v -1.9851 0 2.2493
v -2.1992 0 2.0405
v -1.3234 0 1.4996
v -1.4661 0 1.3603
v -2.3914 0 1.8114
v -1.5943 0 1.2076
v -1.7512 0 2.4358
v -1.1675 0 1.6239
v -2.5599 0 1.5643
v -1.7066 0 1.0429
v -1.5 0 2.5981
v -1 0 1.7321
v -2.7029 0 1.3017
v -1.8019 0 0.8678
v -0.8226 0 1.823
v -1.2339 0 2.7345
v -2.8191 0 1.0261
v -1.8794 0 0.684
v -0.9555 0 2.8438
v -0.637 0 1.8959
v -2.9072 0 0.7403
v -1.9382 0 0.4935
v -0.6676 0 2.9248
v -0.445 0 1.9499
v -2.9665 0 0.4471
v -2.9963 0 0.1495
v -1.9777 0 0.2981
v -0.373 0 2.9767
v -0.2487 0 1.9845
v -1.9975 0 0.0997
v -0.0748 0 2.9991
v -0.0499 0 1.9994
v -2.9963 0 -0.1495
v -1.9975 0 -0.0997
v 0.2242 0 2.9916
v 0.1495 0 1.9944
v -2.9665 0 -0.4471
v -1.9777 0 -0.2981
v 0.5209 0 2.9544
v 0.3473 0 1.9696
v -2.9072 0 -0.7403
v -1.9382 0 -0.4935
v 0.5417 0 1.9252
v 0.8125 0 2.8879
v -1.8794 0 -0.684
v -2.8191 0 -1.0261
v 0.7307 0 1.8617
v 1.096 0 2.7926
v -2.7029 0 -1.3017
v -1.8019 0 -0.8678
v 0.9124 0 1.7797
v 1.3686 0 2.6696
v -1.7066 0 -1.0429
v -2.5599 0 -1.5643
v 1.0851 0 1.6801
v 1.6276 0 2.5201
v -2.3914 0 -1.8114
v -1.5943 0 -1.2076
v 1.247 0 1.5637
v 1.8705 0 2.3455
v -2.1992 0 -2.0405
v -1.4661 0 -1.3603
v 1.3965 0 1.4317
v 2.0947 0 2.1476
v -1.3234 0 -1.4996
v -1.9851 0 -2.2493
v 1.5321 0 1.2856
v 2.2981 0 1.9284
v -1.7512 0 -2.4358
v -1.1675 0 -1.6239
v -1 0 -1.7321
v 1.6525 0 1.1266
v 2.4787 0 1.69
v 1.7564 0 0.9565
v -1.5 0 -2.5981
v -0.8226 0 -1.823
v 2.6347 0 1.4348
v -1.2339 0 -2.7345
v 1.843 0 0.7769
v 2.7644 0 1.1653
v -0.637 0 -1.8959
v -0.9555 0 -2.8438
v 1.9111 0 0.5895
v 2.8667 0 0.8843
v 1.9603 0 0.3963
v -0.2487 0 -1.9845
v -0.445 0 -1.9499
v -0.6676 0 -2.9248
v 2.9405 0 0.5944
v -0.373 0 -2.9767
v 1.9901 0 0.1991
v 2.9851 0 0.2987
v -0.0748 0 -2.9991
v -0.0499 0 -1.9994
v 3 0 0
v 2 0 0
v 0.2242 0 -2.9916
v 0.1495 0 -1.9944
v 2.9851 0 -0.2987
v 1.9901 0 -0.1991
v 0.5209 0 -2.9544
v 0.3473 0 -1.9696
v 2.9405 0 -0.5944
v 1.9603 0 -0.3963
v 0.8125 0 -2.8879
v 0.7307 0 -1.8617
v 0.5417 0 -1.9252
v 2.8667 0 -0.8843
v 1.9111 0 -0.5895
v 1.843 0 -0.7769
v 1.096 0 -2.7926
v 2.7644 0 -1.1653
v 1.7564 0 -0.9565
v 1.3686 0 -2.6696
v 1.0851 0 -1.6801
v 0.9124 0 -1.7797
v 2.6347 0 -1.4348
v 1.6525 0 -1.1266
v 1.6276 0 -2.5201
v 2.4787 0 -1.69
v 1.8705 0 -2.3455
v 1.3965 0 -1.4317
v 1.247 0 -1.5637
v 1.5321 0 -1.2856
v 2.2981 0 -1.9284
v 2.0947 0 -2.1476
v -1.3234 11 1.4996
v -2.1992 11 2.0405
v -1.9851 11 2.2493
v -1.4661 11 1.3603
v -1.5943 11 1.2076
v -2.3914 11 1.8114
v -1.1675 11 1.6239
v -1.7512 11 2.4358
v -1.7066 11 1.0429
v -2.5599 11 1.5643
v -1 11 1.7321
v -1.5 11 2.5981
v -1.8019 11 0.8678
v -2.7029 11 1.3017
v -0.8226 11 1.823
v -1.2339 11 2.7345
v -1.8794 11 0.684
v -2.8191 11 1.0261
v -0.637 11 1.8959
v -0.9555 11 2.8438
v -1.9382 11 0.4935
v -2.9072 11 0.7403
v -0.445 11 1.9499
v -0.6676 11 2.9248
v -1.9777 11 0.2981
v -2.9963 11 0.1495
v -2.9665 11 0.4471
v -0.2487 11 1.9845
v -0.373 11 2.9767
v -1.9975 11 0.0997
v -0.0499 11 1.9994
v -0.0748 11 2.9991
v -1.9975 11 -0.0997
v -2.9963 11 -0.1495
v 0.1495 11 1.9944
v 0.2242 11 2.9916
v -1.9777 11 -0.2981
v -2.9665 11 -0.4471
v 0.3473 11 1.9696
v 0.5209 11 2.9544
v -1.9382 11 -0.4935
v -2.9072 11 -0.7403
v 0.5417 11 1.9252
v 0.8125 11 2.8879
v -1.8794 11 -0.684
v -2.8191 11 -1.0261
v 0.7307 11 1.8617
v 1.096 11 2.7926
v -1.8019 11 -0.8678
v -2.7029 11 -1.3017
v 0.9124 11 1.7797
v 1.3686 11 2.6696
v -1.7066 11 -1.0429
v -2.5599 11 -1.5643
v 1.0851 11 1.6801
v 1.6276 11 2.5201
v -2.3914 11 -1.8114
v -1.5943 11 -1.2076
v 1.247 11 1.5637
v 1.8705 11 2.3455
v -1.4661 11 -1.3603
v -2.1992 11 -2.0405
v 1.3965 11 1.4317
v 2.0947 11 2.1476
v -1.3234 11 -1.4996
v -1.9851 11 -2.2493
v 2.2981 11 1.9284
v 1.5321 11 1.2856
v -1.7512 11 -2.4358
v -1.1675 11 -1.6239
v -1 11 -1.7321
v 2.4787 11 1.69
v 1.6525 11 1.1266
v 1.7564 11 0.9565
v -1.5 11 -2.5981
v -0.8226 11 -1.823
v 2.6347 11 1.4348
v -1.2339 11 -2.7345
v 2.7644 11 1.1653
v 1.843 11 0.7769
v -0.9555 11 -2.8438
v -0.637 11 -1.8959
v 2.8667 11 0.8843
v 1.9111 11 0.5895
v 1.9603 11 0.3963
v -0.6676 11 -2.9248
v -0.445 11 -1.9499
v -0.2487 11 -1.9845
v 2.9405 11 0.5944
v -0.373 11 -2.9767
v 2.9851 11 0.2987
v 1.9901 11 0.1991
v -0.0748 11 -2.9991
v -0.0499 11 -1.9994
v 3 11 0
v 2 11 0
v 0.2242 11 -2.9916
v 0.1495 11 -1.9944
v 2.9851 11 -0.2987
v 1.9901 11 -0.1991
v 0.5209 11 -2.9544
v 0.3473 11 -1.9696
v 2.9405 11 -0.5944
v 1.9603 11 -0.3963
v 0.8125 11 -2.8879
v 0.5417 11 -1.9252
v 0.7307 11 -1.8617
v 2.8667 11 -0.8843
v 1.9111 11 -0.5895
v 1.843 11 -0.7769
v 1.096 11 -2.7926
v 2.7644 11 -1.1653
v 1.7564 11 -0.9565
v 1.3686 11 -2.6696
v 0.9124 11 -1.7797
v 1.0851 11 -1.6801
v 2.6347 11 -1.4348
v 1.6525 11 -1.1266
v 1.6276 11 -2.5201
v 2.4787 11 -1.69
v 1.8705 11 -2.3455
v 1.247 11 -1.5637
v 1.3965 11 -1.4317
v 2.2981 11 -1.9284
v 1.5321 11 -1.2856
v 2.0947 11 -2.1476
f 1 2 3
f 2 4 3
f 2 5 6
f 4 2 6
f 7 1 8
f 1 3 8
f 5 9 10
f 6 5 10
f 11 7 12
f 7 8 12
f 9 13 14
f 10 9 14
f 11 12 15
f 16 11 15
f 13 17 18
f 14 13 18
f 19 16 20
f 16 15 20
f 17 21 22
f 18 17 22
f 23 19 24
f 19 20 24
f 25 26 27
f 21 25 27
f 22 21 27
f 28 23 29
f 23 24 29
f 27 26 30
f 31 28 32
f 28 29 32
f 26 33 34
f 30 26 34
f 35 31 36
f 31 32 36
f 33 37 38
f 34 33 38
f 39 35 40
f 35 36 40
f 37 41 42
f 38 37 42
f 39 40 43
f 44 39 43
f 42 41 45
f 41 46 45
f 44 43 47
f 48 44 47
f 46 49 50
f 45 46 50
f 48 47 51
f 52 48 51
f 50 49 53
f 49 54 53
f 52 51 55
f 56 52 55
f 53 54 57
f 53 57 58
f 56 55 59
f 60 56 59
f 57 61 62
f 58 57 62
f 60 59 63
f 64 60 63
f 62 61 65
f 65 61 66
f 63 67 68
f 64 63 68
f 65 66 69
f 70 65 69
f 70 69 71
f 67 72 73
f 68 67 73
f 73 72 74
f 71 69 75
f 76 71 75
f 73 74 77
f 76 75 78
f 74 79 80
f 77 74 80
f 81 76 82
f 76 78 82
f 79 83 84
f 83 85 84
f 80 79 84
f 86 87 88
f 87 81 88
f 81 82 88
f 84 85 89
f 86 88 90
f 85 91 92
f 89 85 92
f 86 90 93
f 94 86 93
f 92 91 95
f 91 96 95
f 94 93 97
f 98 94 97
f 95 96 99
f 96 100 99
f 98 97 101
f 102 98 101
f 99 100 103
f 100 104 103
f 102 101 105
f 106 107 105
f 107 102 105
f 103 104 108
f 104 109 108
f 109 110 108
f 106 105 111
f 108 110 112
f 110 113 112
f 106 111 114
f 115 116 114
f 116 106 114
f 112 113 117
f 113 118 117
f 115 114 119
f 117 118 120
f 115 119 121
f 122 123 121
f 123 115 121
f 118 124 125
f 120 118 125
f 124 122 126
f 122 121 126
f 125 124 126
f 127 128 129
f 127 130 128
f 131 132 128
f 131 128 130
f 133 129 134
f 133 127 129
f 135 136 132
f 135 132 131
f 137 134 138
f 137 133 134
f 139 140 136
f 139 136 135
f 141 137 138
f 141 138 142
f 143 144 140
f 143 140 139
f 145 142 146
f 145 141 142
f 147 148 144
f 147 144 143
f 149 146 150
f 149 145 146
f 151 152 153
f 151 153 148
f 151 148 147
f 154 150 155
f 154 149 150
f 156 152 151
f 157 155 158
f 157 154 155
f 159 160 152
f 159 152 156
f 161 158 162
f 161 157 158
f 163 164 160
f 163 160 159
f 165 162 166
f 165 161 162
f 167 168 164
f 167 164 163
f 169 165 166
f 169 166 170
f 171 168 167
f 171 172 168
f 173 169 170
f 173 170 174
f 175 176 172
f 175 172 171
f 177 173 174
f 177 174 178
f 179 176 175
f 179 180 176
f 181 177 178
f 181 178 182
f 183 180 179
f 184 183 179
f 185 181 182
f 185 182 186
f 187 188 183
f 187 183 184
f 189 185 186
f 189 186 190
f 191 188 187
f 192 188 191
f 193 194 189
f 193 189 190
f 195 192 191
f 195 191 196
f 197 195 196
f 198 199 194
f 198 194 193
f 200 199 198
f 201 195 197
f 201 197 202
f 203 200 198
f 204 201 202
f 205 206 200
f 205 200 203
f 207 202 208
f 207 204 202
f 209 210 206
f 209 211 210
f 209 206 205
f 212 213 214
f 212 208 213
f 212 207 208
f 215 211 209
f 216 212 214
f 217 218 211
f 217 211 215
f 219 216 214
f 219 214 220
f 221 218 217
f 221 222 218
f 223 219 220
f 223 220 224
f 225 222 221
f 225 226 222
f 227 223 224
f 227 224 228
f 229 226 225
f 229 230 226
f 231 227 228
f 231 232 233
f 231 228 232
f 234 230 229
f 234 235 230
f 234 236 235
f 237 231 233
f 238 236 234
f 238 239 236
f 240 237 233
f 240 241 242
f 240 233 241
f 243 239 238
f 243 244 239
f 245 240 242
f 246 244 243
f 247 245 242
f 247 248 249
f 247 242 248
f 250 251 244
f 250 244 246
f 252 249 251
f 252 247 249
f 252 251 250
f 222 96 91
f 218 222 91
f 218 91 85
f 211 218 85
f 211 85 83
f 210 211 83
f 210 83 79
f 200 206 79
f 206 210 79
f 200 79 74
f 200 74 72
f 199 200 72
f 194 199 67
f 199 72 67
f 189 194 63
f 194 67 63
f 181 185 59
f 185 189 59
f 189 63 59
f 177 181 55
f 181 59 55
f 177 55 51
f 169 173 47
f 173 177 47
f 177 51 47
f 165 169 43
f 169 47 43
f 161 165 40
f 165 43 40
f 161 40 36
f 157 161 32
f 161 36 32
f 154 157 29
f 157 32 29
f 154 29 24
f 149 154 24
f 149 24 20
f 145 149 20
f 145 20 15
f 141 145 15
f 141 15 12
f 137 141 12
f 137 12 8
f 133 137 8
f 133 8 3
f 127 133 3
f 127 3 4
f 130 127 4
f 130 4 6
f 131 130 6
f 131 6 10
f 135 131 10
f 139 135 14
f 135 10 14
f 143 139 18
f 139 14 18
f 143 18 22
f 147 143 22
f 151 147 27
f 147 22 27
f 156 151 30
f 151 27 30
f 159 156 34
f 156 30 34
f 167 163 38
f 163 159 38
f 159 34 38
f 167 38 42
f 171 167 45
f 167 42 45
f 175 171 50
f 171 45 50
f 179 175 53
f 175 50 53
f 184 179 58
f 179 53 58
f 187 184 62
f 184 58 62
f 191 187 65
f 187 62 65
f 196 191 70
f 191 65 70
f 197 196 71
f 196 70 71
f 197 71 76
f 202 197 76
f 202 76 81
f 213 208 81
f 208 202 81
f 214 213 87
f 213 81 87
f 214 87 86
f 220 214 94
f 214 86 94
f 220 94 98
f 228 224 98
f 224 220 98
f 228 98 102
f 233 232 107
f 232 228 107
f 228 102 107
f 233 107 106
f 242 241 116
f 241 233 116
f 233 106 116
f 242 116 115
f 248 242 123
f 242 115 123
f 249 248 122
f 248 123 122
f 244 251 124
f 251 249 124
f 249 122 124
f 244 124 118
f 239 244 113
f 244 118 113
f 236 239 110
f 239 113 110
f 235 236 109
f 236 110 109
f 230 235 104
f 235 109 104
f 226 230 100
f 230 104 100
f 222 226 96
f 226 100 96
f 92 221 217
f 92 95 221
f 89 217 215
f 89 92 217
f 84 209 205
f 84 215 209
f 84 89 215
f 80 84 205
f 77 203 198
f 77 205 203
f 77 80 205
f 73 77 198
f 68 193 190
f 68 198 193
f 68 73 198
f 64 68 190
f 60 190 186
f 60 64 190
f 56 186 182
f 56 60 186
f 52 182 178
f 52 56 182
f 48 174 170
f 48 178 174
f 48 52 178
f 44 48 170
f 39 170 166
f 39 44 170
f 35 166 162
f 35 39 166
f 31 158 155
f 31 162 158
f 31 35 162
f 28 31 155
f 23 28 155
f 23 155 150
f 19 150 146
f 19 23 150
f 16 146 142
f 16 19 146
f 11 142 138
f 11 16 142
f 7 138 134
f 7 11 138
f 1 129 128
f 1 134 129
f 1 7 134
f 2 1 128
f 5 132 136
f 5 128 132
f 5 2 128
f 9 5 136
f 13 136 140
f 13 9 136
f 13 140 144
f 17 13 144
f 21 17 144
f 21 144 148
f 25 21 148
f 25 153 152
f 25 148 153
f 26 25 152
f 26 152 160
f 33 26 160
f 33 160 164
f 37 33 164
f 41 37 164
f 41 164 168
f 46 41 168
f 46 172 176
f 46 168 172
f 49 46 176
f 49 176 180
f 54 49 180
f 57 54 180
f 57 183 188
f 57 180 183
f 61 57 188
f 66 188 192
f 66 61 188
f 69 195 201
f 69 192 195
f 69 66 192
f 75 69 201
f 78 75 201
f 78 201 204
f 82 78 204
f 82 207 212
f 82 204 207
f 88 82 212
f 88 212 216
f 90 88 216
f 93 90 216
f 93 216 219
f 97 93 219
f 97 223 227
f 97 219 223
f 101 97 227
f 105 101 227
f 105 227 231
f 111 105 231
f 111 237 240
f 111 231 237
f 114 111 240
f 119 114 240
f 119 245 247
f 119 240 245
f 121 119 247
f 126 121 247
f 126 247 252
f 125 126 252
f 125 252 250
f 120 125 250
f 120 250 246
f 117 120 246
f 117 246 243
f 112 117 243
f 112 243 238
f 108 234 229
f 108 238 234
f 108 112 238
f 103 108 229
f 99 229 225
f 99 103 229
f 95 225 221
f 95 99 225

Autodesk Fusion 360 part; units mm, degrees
sketch "スケッチ1" plane through (0, 0, 0) normal (0, 1, 0) x (1, 0, 0)
  circle A0 centre (0, 0) radius 1.3
  circle A1 centre (0, 0) radius 2.5
  circle A2 centre (0, 0) radius 1.5
  dimension "d1" = 2.6
extrude "押し出し2" add sketch "スケッチ1" along normal blind 11 contours A1 makes body 1
extrude "押し出し1" add sketch "スケッチ1" along normal blind 11 separate body contours A1 | A2 makes body 2
sketch "スケッチ2" plane through (0, 0, 0) normal (0, 1, 0) x (1, 0, 0)
  circle A0 centre (0, 0) radius 2
  circle A1 centre (0, 0) radius 3
extrude "押し出し3" add sketch "スケッチ2" along normal blind 11 separate body makes body 3
hidden bodies 1 2
